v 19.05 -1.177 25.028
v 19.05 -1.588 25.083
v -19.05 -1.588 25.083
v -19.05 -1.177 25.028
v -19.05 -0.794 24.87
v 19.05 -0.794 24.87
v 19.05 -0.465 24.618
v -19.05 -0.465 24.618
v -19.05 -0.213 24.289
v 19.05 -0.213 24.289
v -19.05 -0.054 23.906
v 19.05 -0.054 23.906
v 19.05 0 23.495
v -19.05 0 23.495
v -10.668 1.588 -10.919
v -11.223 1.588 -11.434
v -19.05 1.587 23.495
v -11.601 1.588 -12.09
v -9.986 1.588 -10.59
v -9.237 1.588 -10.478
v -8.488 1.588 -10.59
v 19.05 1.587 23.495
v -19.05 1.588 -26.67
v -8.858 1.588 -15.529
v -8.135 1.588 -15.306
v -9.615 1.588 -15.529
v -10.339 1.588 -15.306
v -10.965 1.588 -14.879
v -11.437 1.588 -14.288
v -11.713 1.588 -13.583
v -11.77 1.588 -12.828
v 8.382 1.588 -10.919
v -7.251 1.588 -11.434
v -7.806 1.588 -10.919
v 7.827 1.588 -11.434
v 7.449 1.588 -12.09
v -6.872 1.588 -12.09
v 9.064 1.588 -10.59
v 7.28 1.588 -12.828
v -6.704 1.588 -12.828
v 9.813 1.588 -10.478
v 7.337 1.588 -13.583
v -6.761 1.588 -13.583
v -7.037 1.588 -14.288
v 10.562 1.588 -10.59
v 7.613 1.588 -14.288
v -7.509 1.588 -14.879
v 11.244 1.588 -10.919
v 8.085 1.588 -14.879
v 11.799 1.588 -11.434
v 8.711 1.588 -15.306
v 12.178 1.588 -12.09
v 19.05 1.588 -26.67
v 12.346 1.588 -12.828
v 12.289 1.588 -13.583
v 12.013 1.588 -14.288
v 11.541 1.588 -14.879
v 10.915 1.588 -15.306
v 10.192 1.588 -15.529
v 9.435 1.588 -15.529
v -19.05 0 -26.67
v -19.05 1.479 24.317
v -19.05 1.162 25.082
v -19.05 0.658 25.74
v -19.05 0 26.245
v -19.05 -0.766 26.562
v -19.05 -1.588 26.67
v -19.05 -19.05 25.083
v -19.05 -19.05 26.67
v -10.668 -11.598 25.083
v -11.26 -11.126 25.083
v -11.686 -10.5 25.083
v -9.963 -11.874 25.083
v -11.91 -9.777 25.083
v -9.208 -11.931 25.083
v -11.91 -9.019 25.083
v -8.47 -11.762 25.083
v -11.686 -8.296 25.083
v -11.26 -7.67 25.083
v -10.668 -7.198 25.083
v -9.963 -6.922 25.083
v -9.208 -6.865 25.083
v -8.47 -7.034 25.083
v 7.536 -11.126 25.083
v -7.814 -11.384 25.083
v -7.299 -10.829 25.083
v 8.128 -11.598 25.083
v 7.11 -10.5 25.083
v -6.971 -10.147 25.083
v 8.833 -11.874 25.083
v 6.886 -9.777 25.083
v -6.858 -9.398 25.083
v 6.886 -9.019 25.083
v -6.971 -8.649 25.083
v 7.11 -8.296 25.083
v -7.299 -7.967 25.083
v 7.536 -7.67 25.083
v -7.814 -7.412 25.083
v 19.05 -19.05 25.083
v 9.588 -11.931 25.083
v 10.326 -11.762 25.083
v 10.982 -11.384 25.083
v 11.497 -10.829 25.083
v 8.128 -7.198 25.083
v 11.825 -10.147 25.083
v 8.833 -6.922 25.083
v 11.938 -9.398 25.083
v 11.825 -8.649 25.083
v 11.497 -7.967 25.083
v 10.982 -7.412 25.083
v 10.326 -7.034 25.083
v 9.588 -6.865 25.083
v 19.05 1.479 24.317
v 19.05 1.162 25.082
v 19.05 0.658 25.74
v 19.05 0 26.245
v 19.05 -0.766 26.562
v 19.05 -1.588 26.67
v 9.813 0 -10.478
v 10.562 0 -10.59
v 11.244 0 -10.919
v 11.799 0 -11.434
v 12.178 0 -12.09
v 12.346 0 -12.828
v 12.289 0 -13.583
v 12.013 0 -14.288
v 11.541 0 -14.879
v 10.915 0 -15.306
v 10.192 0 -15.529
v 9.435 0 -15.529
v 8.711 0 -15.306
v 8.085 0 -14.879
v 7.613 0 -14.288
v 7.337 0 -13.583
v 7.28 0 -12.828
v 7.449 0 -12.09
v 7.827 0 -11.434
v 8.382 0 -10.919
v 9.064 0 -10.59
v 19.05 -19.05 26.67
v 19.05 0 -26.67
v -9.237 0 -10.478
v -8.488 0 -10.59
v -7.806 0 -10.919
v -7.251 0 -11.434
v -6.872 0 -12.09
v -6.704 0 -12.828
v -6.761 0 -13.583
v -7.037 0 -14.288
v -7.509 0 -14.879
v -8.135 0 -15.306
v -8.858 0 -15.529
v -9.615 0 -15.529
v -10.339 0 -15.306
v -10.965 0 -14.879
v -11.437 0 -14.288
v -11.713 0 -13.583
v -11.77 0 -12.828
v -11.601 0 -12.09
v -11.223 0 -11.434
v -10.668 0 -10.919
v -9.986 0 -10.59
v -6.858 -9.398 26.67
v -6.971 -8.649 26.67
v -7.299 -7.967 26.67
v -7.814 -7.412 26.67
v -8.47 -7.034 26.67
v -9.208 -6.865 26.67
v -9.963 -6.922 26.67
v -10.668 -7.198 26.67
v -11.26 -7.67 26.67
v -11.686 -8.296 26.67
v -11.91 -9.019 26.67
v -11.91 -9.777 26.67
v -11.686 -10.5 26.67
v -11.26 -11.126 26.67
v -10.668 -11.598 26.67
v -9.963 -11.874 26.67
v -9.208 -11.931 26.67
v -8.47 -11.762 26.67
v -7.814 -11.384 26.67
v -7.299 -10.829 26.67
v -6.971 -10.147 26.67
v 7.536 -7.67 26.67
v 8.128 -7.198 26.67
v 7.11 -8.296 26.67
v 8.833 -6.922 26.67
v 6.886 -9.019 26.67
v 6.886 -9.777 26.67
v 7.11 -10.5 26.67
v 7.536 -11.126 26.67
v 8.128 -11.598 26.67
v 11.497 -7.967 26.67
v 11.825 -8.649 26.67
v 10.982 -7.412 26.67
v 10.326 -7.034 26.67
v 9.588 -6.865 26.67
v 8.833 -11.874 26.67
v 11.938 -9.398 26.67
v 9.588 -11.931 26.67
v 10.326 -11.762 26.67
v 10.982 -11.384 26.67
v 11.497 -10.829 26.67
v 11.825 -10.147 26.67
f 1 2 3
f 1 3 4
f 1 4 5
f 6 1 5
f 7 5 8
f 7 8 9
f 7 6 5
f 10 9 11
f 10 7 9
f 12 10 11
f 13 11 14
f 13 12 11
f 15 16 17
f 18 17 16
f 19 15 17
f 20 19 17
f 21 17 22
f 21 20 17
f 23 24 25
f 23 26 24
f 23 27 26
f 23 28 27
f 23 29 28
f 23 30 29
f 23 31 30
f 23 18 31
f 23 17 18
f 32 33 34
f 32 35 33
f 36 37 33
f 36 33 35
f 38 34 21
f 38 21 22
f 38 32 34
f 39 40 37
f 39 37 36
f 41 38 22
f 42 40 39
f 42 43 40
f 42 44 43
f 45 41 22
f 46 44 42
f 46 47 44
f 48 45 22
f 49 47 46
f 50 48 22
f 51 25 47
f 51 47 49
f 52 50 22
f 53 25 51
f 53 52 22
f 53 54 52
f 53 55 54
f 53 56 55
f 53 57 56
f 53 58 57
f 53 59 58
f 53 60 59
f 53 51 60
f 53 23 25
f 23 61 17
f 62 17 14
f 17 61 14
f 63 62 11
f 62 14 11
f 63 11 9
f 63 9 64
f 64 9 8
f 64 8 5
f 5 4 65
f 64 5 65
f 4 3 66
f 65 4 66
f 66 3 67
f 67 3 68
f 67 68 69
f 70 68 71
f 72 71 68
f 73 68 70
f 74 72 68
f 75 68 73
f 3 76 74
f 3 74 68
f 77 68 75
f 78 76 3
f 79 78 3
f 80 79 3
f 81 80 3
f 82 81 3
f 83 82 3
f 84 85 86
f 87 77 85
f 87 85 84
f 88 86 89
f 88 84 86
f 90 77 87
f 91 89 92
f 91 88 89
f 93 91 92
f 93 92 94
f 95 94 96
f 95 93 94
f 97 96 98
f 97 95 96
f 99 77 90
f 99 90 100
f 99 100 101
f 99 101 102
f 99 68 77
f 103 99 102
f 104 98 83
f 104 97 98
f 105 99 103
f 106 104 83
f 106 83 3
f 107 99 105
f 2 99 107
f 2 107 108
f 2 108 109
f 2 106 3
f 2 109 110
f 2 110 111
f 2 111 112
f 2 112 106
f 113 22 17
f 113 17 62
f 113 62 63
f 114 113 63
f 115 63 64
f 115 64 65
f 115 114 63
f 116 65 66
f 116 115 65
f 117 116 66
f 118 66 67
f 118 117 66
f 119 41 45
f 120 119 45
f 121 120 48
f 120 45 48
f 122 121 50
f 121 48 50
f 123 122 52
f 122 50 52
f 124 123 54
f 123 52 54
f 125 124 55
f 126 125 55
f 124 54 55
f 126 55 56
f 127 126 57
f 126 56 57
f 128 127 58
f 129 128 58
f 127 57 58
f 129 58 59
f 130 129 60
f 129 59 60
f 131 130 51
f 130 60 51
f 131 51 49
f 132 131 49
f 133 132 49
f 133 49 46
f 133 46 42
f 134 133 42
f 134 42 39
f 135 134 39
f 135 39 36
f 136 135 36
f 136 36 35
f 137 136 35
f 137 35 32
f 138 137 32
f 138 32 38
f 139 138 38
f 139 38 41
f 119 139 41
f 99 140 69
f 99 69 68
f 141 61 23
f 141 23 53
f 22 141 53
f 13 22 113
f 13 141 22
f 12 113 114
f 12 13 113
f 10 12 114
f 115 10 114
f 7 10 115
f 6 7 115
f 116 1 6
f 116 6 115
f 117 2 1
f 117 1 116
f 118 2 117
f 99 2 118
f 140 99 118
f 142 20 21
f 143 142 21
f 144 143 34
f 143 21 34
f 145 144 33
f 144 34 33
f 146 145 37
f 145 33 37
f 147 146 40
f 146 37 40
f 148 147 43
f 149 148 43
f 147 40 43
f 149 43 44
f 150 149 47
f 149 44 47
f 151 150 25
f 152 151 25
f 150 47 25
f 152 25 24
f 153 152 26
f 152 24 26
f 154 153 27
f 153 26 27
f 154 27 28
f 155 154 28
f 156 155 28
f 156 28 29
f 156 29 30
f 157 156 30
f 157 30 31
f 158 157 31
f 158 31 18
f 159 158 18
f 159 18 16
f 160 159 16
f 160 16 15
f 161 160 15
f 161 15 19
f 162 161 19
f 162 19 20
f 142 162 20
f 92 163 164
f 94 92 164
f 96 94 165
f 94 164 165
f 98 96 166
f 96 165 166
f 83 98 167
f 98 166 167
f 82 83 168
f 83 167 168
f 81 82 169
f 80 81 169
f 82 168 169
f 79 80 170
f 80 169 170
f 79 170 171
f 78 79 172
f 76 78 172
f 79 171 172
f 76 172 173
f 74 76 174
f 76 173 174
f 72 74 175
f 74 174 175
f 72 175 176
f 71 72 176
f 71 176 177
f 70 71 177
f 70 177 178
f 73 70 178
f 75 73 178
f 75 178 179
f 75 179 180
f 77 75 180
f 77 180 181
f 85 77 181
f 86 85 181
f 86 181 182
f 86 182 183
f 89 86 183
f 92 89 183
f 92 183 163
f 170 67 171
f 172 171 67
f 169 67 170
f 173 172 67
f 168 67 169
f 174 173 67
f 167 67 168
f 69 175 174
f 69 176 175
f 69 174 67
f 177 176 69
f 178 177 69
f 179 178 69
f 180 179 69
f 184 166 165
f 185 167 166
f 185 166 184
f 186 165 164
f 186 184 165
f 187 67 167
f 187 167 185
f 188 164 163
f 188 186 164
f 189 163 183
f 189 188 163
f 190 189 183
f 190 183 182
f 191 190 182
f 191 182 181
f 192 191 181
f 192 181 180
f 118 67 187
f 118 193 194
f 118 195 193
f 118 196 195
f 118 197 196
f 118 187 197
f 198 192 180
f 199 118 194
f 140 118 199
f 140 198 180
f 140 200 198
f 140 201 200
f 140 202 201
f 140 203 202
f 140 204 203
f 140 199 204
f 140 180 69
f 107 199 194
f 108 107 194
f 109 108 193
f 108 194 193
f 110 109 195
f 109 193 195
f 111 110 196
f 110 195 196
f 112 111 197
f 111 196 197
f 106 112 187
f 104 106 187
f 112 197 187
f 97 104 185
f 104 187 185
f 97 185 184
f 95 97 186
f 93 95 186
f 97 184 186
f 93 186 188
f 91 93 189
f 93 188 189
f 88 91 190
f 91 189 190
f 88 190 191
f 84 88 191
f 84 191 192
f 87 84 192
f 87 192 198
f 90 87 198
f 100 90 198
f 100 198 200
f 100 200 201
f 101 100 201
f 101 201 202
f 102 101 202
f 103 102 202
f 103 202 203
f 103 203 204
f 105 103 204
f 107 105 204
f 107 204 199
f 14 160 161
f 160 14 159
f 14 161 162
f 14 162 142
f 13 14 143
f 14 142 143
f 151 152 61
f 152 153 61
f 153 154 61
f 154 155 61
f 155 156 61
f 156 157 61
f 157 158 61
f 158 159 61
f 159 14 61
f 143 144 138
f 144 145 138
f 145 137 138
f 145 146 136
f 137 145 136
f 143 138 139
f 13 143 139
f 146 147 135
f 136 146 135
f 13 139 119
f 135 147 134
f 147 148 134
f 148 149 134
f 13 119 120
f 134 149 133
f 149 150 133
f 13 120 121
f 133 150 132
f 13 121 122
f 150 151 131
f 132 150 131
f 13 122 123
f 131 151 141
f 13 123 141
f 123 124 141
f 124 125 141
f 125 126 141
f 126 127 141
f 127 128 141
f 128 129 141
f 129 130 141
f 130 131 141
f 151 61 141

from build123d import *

# Parameters (mm, degrees)
SKETCH1_W                    = 38.1
SKETCH1_H                    = 53.34
BOSS_EXTRUDE1_DEPTH          = 1.5875
EDGE_FLANGE1_STRIP_W         = 9.525
EDGE_FLANGE1_STRIP_H         = 1.5875
EDGE_FLANGE1_STRIP_CUT_DEPTH = 38.1
EDGE_FLANGE1_DEPTH           = 38.1
CUT_EXTRUDE1_REACH           = 40.731
SKETCH9_R                    = 2.54
CUT_EXTRUDE2_REACH           = 61.758
SKETCH11_R                   = 2.54


# Sheet-metal steps are written as plain solids
with BuildPart() as part:
    # Sketch1 → Boss-Extrude1 (new body)
    with BuildSketch(Plane(origin=(0, 0, 0), x_dir=(1, 0, 0), z_dir=(0, 1, 0))):
        Rectangle(SKETCH1_W, SKETCH1_H)
    extrude(amount=BOSS_EXTRUDE1_DEPTH)

    # Edge-Flange1 strip (across the edge) → Edge-Flange1 strip cut (cut)
    with BuildSketch(Plane(origin=(19.05, 0, 26.67), x_dir=(0, 0, -1), z_dir=(-1, 0, 0))):
        with Locations((-1.5875, -0.79375)):
            Rectangle(EDGE_FLANGE1_STRIP_W, EDGE_FLANGE1_STRIP_H)
    extrude(amount=EDGE_FLANGE1_STRIP_CUT_DEPTH, mode=Mode.SUBTRACT)

    # Edge-Flange1 section (across the edge) → Edge-Flange1 (add)
    with BuildSketch(Plane(origin=(19.05, 0, 26.67), x_dir=(0, 0, -1), z_dir=(-1, 0, 0))):
        with BuildLine():
            Line((0, 1.5875), (0, 19.05))
            Line((0, 19.05), (1.5875, 19.05))
            Line((1.5875, 19.05), (1.5875, 1.5875))
            ThreePointArc((1.5875, 1.5875), (2.052467985, 0.464967985), (3.175, 0))
            Line((3.175, 0), (3.175, -1.5875))
            ThreePointArc((3.175, -1.5875), (0.92993597, -0.65756403), (0, 1.5875))
        make_face()
    extrude(amount=EDGE_FLANGE1_DEPTH)

    # Sketch9 → Cut-Extrude1 (cut, up to next)
    with BuildSketch(Plane(origin=(0, 1.5875, 0), x_dir=(1, 0, 0), z_dir=(0, 1, 0)), mode=Mode.PRIVATE) as cut_extrude1_sk1:
        with Locations(Location((9.813099354, 13.0175, 0), (0, 0, 270))):
            Circle(SKETCH9_R)
    cut_extrude1_tool1 = extrude(cut_extrude1_sk1.sketch, amount=-CUT_EXTRUDE1_REACH, mode=Mode.PRIVATE) & part.part
    # Sketch9 → Cut-Extrude1 (cut, up to next)
    with BuildSketch(Plane(origin=(0, 1.5875, 0), x_dir=(1, 0, 0), z_dir=(0, 1, 0)), mode=Mode.PRIVATE) as cut_extrude1_sk2:
        with Locations(Location((-9.236900646, 13.0175, 0), (0, 0, 270))):
            Circle(SKETCH9_R)
    cut_extrude1_tool2 = extrude(cut_extrude1_sk2.sketch, amount=-CUT_EXTRUDE1_REACH, mode=Mode.PRIVATE) & part.part
    add(cut_extrude1_tool1.solids().sort_by_distance((9.813099, 1.5875, -13.0175))[0], mode=Mode.SUBTRACT)
    add(cut_extrude1_tool2.solids().sort_by_distance((-9.236901, 1.5875, -13.0175))[0], mode=Mode.SUBTRACT)

    # Sketch11 → Cut-Extrude2 (cut, up to next)
    with BuildSketch(Plane.XY.offset(26.67), mode=Mode.PRIVATE) as cut_extrude2_sk1:
        with Locations((-9.398, -9.398)):
            Circle(SKETCH11_R)
    cut_extrude2_tool1 = extrude(cut_extrude2_sk1.sketch, amount=-CUT_EXTRUDE2_REACH, mode=Mode.PRIVATE) & part.part
    # Sketch11 → Cut-Extrude2 (cut, up to next)
    with BuildSketch(Plane.XY.offset(26.67), mode=Mode.PRIVATE) as cut_extrude2_sk2:
        with Locations((9.398, -9.398)):
            Circle(SKETCH11_R)
    cut_extrude2_tool2 = extrude(cut_extrude2_sk2.sketch, amount=-CUT_EXTRUDE2_REACH, mode=Mode.PRIVATE) & part.part
    add(cut_extrude2_tool1.solids().sort_by_distance((-9.398, -9.398, 26.67))[0], mode=Mode.SUBTRACT)
    add(cut_extrude2_tool2.solids().sort_by_distance((9.398, -9.398, 26.67))[0], mode=Mode.SUBTRACT)


solid = part.part
